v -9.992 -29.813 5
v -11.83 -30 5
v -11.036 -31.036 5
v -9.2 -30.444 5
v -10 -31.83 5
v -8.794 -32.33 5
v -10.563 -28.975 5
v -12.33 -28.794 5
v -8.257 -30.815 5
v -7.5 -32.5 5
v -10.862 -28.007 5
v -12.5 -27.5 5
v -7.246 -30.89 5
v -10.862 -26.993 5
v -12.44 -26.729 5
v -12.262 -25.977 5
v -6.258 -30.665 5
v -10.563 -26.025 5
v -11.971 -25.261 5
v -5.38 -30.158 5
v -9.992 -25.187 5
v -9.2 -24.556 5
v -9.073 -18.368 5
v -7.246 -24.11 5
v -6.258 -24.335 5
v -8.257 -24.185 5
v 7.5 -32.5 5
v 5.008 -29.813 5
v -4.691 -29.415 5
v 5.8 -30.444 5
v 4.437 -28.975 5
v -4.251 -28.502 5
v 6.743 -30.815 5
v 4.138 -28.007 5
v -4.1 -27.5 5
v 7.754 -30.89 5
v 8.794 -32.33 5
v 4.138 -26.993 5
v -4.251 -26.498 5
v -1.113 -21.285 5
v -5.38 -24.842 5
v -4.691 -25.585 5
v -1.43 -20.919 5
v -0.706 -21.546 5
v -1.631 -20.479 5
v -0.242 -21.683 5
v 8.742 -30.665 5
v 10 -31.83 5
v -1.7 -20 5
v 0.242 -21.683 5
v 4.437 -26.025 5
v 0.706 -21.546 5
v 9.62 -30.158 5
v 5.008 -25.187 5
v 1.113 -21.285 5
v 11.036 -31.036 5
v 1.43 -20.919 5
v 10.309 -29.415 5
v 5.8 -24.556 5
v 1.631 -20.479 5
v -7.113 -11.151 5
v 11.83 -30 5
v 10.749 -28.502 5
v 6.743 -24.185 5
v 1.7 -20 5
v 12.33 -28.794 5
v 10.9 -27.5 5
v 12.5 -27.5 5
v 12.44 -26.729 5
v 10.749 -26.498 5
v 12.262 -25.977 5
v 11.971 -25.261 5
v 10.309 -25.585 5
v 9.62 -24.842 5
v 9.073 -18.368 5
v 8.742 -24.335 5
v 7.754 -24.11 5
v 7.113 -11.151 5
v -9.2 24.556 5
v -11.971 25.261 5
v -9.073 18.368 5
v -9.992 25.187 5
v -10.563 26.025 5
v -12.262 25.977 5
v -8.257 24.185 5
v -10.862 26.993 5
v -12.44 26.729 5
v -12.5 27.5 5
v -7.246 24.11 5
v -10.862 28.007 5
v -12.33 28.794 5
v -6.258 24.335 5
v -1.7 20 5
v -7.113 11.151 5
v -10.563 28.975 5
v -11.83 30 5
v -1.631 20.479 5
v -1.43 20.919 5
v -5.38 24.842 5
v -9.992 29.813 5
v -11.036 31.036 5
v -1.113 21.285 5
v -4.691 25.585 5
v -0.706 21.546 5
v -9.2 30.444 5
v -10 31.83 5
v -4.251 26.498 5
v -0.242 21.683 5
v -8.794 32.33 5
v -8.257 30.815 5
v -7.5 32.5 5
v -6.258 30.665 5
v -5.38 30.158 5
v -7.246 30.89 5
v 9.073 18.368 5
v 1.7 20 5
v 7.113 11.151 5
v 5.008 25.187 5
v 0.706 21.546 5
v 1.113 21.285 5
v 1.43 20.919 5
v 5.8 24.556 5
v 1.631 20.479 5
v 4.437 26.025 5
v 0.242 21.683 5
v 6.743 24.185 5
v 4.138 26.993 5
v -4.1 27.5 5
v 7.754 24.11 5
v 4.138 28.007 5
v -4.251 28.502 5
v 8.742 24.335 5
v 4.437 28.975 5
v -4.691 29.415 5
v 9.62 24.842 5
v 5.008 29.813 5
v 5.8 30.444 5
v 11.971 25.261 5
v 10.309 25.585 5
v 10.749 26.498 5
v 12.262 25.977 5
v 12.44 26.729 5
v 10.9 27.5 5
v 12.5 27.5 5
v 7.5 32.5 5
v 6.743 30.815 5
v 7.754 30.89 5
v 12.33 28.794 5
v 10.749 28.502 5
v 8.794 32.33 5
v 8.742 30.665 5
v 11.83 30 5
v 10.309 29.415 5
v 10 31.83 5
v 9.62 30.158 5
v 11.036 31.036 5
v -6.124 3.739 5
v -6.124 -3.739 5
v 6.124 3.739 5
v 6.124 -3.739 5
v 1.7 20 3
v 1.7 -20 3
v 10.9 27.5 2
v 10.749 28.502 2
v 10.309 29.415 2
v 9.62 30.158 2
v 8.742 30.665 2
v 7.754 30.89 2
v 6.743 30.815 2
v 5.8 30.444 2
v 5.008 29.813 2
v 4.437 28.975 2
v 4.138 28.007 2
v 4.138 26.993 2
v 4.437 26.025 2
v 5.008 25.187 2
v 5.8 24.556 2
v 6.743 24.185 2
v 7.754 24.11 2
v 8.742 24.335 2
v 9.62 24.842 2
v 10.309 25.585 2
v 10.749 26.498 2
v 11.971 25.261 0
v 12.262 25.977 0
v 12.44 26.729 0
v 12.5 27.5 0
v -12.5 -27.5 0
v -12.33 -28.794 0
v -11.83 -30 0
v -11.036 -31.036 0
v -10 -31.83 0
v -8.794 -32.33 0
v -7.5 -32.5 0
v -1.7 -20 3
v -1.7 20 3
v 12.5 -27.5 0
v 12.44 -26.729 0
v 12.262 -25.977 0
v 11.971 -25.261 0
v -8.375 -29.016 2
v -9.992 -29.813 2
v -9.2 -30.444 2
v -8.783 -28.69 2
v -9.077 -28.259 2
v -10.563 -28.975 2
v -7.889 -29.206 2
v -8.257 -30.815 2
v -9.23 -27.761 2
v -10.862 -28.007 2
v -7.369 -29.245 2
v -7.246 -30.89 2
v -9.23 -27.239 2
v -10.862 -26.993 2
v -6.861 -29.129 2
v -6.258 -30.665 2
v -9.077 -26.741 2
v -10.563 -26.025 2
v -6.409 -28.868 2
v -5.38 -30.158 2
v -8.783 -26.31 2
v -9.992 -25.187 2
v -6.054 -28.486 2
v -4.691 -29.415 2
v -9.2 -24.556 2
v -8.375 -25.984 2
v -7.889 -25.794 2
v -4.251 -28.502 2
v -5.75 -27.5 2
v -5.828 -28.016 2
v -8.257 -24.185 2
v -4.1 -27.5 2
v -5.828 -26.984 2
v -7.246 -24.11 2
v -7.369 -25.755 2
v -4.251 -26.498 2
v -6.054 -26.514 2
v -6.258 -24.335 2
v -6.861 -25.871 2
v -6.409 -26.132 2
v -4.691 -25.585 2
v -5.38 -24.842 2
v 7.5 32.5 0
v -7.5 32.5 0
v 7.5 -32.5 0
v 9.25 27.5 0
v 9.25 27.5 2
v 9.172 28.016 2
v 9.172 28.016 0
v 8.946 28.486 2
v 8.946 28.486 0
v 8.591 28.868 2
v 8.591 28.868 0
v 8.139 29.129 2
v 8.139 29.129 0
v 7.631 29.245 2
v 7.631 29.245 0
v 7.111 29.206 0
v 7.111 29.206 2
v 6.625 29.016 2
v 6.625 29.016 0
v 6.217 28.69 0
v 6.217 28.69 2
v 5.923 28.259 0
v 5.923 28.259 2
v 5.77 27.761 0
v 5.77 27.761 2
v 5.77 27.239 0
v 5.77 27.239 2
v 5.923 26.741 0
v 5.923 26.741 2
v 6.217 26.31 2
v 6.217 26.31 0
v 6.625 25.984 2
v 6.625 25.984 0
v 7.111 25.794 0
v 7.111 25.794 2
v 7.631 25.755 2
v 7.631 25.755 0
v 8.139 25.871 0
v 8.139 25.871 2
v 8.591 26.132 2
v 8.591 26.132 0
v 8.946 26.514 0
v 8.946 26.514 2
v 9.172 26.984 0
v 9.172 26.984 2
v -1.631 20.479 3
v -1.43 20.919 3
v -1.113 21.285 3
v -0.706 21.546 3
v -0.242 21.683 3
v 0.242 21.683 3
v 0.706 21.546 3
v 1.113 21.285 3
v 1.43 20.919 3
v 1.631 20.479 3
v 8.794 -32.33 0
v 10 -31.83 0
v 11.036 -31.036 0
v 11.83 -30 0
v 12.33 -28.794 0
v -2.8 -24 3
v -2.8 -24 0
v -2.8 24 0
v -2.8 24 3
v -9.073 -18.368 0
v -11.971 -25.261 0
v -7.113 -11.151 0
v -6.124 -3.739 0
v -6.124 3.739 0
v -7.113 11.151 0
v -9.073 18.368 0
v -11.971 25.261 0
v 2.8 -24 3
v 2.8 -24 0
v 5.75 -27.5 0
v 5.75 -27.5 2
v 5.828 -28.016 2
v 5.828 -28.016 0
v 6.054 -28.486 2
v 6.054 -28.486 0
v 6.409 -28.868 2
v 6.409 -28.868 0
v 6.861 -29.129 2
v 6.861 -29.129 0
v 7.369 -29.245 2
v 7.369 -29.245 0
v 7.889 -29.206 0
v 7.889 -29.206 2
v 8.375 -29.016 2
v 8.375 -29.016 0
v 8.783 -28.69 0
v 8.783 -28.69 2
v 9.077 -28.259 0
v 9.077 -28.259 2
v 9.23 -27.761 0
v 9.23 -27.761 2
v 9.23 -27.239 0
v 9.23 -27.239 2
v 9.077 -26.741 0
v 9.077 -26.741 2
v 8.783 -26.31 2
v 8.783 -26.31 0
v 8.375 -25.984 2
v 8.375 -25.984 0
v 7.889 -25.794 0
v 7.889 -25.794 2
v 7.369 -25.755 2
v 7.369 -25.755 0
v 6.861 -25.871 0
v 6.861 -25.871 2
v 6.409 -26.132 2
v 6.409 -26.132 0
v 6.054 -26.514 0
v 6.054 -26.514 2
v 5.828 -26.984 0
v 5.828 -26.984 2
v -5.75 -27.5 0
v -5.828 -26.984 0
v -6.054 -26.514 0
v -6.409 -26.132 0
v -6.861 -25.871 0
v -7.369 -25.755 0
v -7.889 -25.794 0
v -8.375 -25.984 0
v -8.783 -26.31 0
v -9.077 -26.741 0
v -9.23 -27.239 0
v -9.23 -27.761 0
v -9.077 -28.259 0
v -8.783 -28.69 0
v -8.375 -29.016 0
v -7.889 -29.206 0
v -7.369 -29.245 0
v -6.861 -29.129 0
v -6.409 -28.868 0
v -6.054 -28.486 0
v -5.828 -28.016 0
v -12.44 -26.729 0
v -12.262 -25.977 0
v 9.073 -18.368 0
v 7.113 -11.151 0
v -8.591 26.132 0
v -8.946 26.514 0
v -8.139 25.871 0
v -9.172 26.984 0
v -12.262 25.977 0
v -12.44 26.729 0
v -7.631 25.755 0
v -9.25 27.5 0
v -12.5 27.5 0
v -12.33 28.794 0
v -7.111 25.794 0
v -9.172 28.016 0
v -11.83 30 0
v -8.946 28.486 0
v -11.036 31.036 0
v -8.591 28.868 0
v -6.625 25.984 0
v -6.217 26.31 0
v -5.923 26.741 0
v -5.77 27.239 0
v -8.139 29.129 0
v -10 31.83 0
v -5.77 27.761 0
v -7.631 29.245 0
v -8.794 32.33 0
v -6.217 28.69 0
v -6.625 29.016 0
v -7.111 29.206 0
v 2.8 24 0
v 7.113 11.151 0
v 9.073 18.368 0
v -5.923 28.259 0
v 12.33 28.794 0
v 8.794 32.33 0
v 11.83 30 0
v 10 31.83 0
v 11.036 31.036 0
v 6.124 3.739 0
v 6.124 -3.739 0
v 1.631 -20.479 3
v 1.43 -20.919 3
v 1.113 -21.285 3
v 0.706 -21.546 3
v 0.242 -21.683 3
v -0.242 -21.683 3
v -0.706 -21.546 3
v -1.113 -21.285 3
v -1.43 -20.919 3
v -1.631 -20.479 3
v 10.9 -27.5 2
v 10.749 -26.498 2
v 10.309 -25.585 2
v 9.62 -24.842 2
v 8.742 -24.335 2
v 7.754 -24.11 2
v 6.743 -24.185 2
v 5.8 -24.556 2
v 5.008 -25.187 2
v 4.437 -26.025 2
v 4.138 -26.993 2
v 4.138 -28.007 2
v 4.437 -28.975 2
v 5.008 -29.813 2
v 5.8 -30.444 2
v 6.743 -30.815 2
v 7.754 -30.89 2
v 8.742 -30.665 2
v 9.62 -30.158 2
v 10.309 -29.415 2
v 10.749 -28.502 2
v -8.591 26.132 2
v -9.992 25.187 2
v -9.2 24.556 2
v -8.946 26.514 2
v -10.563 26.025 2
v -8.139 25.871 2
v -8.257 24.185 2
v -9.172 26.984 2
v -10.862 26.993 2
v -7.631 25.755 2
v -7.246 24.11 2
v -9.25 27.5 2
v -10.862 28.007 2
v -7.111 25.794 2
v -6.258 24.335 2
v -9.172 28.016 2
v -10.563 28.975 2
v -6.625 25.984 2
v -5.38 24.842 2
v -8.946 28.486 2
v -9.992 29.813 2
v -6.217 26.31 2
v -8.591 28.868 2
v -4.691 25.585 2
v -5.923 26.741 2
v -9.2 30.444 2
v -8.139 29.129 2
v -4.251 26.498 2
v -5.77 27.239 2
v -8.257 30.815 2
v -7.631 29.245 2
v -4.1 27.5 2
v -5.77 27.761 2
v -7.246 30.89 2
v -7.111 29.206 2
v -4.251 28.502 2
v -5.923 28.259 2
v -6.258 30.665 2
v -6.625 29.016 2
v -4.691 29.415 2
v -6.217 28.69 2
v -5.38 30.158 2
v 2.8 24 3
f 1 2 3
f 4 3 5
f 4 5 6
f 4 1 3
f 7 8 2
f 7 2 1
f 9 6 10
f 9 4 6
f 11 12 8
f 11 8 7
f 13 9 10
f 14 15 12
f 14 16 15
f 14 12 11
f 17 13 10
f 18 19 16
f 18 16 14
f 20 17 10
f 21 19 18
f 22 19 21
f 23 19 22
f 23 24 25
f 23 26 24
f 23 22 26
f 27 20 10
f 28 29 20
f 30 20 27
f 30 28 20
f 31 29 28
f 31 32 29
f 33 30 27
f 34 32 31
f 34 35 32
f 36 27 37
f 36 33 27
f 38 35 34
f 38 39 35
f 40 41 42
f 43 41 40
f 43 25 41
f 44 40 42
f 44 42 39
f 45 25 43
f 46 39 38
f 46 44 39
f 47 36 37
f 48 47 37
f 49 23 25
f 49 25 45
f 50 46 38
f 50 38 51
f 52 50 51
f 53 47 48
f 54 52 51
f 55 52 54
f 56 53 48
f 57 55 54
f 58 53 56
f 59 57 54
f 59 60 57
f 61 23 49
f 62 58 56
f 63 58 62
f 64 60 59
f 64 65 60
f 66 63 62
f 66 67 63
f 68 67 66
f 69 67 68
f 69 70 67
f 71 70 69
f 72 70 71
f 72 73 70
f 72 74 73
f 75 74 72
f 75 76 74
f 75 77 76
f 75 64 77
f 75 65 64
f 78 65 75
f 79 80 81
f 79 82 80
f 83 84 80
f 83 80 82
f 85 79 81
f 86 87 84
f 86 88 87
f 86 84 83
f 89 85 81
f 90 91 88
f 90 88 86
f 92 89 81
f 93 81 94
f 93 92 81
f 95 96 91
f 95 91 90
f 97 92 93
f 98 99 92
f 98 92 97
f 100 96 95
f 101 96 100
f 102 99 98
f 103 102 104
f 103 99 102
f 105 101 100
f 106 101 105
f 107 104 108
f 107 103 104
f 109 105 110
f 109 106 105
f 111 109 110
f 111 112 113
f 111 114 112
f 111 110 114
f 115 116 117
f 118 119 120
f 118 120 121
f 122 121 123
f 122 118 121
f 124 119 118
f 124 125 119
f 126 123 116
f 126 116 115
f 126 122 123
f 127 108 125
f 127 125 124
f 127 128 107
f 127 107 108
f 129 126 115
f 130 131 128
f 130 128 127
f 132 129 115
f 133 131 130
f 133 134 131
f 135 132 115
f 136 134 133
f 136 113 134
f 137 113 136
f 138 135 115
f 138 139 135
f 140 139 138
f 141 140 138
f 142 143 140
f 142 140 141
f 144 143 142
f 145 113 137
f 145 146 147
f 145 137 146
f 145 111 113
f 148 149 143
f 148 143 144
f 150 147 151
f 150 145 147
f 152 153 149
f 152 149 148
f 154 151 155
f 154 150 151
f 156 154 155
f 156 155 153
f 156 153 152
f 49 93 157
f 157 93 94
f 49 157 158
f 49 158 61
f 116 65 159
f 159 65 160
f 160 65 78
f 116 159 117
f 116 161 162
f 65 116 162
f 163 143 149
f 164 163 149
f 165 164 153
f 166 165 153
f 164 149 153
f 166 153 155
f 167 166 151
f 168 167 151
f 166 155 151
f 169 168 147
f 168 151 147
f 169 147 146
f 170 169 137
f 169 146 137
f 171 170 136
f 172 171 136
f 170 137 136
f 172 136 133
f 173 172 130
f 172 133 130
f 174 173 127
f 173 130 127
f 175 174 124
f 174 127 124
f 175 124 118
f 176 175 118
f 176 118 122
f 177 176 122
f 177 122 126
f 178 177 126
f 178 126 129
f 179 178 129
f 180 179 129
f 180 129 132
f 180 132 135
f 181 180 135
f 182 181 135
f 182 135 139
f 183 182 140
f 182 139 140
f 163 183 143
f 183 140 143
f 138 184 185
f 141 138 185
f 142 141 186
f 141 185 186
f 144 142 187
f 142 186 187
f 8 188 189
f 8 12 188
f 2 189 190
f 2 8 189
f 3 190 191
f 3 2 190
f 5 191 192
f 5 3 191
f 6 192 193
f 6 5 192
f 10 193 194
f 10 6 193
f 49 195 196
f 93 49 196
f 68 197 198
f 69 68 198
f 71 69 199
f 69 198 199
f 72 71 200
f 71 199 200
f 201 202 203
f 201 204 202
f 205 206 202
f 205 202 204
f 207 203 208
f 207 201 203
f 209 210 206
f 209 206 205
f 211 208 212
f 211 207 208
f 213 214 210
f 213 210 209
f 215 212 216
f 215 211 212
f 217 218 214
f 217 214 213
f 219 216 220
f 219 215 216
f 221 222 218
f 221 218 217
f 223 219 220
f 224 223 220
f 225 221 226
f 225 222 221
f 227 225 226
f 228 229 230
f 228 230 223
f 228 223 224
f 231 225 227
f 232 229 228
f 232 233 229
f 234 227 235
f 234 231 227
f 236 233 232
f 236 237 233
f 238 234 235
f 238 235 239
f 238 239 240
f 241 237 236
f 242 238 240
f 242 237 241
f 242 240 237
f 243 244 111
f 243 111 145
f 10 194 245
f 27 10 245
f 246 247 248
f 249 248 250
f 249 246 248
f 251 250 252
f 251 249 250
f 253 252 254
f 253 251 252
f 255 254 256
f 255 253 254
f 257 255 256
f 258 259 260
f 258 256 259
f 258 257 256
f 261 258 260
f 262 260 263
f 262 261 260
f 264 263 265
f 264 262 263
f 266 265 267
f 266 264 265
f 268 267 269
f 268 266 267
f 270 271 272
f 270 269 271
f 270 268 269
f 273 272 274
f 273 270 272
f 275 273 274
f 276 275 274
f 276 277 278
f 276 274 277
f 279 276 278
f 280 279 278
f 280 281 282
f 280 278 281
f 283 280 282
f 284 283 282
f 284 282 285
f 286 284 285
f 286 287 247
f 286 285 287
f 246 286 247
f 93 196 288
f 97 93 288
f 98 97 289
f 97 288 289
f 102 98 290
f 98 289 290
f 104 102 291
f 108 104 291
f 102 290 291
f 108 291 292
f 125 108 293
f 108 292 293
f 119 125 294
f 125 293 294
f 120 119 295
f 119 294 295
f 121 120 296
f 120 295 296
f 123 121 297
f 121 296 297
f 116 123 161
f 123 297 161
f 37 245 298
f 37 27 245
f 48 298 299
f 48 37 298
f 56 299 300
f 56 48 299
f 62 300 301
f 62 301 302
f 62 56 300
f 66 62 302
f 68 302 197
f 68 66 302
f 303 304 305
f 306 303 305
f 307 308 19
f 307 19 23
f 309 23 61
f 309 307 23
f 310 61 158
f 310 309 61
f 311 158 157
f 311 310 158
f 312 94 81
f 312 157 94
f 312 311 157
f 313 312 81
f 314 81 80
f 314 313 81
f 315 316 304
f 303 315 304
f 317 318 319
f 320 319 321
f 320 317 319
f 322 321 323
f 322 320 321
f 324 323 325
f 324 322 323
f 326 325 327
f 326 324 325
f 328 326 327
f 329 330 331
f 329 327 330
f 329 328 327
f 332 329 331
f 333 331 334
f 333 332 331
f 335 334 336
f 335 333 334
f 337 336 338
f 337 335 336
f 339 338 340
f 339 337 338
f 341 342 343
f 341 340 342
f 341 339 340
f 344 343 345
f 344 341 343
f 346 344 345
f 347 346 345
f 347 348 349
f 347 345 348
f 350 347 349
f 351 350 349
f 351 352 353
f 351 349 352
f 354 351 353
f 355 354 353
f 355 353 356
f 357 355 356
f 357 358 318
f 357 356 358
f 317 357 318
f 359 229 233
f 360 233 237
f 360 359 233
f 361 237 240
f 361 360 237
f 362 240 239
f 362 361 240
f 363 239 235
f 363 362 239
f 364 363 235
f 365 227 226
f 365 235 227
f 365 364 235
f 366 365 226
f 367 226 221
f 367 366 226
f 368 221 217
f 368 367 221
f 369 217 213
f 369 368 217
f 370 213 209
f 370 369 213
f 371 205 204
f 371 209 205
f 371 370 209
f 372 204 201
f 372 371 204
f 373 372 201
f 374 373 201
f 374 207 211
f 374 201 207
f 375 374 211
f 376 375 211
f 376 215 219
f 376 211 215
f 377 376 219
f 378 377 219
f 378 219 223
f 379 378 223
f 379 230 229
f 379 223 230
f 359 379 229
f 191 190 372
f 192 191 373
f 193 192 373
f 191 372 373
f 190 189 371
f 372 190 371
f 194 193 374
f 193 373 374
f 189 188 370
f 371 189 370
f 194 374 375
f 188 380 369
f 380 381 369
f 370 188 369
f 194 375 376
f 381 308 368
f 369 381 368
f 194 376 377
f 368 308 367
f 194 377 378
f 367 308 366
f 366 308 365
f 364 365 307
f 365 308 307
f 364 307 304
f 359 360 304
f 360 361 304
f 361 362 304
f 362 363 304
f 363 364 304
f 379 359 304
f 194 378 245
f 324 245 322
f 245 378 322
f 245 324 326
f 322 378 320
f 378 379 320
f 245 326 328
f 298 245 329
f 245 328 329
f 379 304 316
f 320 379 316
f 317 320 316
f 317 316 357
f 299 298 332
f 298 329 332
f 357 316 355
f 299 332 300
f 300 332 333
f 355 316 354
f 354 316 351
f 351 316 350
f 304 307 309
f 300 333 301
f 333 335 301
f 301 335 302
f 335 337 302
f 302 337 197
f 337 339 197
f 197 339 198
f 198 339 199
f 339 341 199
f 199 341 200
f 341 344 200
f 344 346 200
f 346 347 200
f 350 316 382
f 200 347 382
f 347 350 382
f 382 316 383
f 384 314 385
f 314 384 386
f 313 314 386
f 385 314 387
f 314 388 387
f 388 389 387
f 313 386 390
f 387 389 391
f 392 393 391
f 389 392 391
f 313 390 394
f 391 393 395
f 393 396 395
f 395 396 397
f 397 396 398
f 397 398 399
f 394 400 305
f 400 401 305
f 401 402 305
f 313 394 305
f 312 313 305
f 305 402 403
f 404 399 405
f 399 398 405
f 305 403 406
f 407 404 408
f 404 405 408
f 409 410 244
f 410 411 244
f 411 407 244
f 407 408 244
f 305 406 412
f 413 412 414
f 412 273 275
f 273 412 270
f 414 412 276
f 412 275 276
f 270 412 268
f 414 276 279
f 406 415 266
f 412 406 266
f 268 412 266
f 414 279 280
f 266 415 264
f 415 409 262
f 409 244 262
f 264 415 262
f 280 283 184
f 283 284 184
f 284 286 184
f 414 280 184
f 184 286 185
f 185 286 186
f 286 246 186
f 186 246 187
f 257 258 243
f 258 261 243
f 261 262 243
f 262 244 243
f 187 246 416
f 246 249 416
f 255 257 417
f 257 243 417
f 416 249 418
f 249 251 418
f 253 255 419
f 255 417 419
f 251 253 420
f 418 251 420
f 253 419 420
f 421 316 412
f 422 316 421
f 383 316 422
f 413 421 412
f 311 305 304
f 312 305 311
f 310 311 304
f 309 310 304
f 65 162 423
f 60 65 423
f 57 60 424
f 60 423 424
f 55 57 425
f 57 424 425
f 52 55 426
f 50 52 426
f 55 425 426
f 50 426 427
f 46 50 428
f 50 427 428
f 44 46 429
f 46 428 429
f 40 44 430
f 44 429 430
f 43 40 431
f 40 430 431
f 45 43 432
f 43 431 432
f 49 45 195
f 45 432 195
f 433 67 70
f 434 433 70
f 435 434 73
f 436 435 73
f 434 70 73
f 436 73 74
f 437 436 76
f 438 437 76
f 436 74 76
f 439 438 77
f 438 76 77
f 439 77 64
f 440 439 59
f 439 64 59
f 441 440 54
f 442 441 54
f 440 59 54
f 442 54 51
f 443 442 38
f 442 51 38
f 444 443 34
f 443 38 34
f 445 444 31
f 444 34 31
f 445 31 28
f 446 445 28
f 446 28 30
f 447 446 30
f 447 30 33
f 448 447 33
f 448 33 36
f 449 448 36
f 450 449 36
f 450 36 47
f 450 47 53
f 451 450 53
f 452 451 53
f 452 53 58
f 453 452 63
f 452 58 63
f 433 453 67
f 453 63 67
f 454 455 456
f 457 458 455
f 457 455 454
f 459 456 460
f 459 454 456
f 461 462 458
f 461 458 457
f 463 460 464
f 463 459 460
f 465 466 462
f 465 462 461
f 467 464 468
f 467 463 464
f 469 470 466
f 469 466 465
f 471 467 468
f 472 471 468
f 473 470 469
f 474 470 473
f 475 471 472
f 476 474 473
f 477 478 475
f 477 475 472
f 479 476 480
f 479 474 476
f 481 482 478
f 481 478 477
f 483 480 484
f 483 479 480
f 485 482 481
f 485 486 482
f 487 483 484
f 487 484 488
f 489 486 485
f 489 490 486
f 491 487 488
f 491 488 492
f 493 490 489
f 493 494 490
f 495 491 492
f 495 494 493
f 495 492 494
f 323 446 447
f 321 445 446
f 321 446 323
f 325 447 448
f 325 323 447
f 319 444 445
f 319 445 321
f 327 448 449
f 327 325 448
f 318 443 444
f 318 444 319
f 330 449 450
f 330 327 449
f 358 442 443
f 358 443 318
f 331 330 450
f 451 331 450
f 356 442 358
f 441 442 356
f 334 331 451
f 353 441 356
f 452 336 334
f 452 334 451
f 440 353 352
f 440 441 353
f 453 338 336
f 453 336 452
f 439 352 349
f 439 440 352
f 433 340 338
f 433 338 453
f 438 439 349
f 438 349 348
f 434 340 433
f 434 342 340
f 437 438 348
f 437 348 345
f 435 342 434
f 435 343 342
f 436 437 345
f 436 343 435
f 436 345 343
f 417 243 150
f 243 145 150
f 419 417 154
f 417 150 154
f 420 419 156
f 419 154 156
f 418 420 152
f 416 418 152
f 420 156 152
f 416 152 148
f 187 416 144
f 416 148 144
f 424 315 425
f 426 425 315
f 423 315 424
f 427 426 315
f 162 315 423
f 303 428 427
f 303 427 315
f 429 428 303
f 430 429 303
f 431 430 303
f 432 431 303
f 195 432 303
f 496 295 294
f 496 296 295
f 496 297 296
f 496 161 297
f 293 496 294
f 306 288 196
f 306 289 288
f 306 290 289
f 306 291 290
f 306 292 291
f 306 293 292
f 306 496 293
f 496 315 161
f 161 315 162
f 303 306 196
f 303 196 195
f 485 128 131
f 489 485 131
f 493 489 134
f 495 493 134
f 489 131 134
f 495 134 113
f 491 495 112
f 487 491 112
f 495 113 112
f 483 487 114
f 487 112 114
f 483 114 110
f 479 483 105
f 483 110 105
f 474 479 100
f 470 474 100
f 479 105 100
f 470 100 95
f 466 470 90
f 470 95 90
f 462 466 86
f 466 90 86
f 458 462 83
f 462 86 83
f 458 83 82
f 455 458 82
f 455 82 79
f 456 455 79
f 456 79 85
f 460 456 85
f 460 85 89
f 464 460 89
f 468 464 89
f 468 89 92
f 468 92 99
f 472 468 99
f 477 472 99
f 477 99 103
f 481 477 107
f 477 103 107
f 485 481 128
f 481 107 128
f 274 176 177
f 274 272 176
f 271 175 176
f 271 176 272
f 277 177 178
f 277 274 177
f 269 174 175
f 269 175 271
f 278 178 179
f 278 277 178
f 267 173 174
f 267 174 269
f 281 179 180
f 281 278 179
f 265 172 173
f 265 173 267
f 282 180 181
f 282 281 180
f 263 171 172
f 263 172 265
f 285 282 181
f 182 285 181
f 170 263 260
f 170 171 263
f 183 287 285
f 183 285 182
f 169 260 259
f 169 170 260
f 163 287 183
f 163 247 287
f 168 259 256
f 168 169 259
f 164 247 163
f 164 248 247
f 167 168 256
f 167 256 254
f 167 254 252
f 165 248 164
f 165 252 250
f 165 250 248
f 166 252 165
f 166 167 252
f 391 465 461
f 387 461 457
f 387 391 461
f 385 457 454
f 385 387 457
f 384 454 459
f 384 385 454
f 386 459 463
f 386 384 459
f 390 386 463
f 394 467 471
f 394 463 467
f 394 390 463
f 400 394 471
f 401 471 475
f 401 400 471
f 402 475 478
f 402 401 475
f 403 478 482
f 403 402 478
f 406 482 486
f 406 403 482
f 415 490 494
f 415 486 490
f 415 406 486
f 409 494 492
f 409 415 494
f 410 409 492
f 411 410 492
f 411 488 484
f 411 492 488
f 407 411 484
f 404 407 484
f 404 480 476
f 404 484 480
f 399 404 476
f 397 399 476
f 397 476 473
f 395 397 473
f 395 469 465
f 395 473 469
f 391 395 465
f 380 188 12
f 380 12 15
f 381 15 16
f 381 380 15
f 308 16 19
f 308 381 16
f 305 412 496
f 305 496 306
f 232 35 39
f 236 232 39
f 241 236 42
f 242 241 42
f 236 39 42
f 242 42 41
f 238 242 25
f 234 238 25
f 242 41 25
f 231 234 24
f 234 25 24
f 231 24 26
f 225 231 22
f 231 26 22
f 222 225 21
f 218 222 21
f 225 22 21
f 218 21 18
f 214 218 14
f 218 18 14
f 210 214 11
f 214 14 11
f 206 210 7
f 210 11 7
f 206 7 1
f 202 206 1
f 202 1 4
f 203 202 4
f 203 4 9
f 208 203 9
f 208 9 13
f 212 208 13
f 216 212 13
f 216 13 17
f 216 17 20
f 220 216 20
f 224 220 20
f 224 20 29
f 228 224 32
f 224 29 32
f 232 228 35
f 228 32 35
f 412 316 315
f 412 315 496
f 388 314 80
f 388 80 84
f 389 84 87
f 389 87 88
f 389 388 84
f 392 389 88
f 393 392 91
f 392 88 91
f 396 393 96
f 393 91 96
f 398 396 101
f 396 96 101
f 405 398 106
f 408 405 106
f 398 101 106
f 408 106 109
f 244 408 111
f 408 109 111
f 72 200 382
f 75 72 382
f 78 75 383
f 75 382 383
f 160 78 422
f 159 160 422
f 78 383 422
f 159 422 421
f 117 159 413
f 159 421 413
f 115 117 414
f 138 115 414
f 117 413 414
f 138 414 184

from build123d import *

# Parameters (mm, degrees)
ESBO_O1_W                  = 25
ESBO_O1_H                  = 65
ESBO_O1_R                  = 1.75
RESSALTO_EXTRUS_O1_DEPTH   = 5
CORTE_EXTRUS_O3_DEPTH      = 36.178118199
CORTE_EXTRUS_O3_DEPTH_BACK = 36.178118199
FILETE1_R                  = 5
ESBO_O2_R                  = 3.4
CORTE_EXTRUS_O1_DEPTH      = 3
ESBO_O3_W                  = 5.6
ESBO_O3_H                  = 48
CORTE_EXTRUS_O2_DEPTH      = 3


with BuildPart() as part:
    # Esboço1 → Ressalto-extrusão1 (new body)
    with BuildSketch(Plane.XY):
        Rectangle(ESBO_O1_W, ESBO_O1_H)
        with Locations((7.5, 27.5)):
            Circle(ESBO_O1_R, mode=Mode.SUBTRACT)
        with Locations(Location((7.5, -27.5, 0), (0, 0, 180))):
            Circle(ESBO_O1_R, mode=Mode.SUBTRACT)
        with Locations((-7.5, -27.5)):
            Circle(ESBO_O1_R, mode=Mode.SUBTRACT)
        with Locations(Location((-7.5, 27.5, 0), (0, 0, 180))):
            Circle(ESBO_O1_R, mode=Mode.SUBTRACT)
        with BuildLine():
            Line((-1.7, -20), (-1.7, 20))
            ThreePointArc((-1.7, 20), (0, 21.7), (1.7, 20))
            Line((1.7, 20), (1.7, -20))
            ThreePointArc((1.7, -20), (0, -21.7), (-1.7, -20))
        make_face(mode=Mode.SUBTRACT)
    extrude(amount=RESSALTO_EXTRUS_O1_DEPTH)

    # Esboço4 → Corte-extrusão3 (cut, two sides: drawn at the far end of the back side and taken through both)
    with BuildSketch(Plane.XY.offset(5).offset(-CORTE_EXTRUS_O3_DEPTH_BACK)):
        with BuildLine():
            Line((12.5, 27.5), (12.5, -27.5))
            ThreePointArc((12.5, -27.5), (12.365923064, -26.34987273), (11.970882905, -25.261427677))
            ThreePointArc((11.970882905, -25.261427677), (6, 0), (11.970882905, 25.261427677))
            ThreePointArc((11.970882905, 25.261427677), (12.365923064, 26.34987273), (12.5, 27.5))
        make_face()
        with BuildLine():
            Line((-12.5, 27.5), (-12.5, -27.5))
            ThreePointArc((-12.5, -27.5), (-12.365923064, -26.34987273), (-11.970882905, -25.261427677))
            ThreePointArc((-11.970882905, -25.261427677), (-6, 0), (-11.970882905, 25.261427677))
            ThreePointArc((-11.970882905, 25.261427677), (-12.365923064, 26.34987273), (-12.5, 27.5))
        make_face()
    extrude(amount=CORTE_EXTRUS_O3_DEPTH + CORTE_EXTRUS_O3_DEPTH_BACK, mode=Mode.SUBTRACT)

    # Filete1
    filete1_edges = [part.edges().sort_by_distance(p)[0] for p in [
        (-12.5, -32.5, 2.5),
        (12.5, -32.5, 2.5),
        (12.5, 32.5, 2.5),
        (-12.5, 32.5, 2.5),
    ]]
    fillet(filete1_edges, radius=FILETE1_R - 0.0001)  # a hair under: the kernel refuses the full size

    # Esboço2 → Corte-extrusão1 (cut)
    with BuildSketch(Plane.XY.offset(5)):
        with Locations((7.5, 27.5)):
            Circle(ESBO_O2_R)
        with Locations((-7.5, 27.5)):
            Circle(ESBO_O2_R)
        with Locations((-7.5, -27.5)):
            Circle(ESBO_O2_R)
        with Locations((7.5, -27.5)):
            Circle(ESBO_O2_R)
    extrude(amount=-CORTE_EXTRUS_O1_DEPTH, mode=Mode.SUBTRACT)

    # Esboço3 → Corte-extrusão2 (cut)
    with BuildSketch(Plane(origin=(0, 0, 0), x_dir=(-1, 0, 0), z_dir=(0, 0, -1))):
        Rectangle(ESBO_O3_W, ESBO_O3_H)
    extrude(amount=-CORTE_EXTRUS_O2_DEPTH, mode=Mode.SUBTRACT)


solid = part.part
